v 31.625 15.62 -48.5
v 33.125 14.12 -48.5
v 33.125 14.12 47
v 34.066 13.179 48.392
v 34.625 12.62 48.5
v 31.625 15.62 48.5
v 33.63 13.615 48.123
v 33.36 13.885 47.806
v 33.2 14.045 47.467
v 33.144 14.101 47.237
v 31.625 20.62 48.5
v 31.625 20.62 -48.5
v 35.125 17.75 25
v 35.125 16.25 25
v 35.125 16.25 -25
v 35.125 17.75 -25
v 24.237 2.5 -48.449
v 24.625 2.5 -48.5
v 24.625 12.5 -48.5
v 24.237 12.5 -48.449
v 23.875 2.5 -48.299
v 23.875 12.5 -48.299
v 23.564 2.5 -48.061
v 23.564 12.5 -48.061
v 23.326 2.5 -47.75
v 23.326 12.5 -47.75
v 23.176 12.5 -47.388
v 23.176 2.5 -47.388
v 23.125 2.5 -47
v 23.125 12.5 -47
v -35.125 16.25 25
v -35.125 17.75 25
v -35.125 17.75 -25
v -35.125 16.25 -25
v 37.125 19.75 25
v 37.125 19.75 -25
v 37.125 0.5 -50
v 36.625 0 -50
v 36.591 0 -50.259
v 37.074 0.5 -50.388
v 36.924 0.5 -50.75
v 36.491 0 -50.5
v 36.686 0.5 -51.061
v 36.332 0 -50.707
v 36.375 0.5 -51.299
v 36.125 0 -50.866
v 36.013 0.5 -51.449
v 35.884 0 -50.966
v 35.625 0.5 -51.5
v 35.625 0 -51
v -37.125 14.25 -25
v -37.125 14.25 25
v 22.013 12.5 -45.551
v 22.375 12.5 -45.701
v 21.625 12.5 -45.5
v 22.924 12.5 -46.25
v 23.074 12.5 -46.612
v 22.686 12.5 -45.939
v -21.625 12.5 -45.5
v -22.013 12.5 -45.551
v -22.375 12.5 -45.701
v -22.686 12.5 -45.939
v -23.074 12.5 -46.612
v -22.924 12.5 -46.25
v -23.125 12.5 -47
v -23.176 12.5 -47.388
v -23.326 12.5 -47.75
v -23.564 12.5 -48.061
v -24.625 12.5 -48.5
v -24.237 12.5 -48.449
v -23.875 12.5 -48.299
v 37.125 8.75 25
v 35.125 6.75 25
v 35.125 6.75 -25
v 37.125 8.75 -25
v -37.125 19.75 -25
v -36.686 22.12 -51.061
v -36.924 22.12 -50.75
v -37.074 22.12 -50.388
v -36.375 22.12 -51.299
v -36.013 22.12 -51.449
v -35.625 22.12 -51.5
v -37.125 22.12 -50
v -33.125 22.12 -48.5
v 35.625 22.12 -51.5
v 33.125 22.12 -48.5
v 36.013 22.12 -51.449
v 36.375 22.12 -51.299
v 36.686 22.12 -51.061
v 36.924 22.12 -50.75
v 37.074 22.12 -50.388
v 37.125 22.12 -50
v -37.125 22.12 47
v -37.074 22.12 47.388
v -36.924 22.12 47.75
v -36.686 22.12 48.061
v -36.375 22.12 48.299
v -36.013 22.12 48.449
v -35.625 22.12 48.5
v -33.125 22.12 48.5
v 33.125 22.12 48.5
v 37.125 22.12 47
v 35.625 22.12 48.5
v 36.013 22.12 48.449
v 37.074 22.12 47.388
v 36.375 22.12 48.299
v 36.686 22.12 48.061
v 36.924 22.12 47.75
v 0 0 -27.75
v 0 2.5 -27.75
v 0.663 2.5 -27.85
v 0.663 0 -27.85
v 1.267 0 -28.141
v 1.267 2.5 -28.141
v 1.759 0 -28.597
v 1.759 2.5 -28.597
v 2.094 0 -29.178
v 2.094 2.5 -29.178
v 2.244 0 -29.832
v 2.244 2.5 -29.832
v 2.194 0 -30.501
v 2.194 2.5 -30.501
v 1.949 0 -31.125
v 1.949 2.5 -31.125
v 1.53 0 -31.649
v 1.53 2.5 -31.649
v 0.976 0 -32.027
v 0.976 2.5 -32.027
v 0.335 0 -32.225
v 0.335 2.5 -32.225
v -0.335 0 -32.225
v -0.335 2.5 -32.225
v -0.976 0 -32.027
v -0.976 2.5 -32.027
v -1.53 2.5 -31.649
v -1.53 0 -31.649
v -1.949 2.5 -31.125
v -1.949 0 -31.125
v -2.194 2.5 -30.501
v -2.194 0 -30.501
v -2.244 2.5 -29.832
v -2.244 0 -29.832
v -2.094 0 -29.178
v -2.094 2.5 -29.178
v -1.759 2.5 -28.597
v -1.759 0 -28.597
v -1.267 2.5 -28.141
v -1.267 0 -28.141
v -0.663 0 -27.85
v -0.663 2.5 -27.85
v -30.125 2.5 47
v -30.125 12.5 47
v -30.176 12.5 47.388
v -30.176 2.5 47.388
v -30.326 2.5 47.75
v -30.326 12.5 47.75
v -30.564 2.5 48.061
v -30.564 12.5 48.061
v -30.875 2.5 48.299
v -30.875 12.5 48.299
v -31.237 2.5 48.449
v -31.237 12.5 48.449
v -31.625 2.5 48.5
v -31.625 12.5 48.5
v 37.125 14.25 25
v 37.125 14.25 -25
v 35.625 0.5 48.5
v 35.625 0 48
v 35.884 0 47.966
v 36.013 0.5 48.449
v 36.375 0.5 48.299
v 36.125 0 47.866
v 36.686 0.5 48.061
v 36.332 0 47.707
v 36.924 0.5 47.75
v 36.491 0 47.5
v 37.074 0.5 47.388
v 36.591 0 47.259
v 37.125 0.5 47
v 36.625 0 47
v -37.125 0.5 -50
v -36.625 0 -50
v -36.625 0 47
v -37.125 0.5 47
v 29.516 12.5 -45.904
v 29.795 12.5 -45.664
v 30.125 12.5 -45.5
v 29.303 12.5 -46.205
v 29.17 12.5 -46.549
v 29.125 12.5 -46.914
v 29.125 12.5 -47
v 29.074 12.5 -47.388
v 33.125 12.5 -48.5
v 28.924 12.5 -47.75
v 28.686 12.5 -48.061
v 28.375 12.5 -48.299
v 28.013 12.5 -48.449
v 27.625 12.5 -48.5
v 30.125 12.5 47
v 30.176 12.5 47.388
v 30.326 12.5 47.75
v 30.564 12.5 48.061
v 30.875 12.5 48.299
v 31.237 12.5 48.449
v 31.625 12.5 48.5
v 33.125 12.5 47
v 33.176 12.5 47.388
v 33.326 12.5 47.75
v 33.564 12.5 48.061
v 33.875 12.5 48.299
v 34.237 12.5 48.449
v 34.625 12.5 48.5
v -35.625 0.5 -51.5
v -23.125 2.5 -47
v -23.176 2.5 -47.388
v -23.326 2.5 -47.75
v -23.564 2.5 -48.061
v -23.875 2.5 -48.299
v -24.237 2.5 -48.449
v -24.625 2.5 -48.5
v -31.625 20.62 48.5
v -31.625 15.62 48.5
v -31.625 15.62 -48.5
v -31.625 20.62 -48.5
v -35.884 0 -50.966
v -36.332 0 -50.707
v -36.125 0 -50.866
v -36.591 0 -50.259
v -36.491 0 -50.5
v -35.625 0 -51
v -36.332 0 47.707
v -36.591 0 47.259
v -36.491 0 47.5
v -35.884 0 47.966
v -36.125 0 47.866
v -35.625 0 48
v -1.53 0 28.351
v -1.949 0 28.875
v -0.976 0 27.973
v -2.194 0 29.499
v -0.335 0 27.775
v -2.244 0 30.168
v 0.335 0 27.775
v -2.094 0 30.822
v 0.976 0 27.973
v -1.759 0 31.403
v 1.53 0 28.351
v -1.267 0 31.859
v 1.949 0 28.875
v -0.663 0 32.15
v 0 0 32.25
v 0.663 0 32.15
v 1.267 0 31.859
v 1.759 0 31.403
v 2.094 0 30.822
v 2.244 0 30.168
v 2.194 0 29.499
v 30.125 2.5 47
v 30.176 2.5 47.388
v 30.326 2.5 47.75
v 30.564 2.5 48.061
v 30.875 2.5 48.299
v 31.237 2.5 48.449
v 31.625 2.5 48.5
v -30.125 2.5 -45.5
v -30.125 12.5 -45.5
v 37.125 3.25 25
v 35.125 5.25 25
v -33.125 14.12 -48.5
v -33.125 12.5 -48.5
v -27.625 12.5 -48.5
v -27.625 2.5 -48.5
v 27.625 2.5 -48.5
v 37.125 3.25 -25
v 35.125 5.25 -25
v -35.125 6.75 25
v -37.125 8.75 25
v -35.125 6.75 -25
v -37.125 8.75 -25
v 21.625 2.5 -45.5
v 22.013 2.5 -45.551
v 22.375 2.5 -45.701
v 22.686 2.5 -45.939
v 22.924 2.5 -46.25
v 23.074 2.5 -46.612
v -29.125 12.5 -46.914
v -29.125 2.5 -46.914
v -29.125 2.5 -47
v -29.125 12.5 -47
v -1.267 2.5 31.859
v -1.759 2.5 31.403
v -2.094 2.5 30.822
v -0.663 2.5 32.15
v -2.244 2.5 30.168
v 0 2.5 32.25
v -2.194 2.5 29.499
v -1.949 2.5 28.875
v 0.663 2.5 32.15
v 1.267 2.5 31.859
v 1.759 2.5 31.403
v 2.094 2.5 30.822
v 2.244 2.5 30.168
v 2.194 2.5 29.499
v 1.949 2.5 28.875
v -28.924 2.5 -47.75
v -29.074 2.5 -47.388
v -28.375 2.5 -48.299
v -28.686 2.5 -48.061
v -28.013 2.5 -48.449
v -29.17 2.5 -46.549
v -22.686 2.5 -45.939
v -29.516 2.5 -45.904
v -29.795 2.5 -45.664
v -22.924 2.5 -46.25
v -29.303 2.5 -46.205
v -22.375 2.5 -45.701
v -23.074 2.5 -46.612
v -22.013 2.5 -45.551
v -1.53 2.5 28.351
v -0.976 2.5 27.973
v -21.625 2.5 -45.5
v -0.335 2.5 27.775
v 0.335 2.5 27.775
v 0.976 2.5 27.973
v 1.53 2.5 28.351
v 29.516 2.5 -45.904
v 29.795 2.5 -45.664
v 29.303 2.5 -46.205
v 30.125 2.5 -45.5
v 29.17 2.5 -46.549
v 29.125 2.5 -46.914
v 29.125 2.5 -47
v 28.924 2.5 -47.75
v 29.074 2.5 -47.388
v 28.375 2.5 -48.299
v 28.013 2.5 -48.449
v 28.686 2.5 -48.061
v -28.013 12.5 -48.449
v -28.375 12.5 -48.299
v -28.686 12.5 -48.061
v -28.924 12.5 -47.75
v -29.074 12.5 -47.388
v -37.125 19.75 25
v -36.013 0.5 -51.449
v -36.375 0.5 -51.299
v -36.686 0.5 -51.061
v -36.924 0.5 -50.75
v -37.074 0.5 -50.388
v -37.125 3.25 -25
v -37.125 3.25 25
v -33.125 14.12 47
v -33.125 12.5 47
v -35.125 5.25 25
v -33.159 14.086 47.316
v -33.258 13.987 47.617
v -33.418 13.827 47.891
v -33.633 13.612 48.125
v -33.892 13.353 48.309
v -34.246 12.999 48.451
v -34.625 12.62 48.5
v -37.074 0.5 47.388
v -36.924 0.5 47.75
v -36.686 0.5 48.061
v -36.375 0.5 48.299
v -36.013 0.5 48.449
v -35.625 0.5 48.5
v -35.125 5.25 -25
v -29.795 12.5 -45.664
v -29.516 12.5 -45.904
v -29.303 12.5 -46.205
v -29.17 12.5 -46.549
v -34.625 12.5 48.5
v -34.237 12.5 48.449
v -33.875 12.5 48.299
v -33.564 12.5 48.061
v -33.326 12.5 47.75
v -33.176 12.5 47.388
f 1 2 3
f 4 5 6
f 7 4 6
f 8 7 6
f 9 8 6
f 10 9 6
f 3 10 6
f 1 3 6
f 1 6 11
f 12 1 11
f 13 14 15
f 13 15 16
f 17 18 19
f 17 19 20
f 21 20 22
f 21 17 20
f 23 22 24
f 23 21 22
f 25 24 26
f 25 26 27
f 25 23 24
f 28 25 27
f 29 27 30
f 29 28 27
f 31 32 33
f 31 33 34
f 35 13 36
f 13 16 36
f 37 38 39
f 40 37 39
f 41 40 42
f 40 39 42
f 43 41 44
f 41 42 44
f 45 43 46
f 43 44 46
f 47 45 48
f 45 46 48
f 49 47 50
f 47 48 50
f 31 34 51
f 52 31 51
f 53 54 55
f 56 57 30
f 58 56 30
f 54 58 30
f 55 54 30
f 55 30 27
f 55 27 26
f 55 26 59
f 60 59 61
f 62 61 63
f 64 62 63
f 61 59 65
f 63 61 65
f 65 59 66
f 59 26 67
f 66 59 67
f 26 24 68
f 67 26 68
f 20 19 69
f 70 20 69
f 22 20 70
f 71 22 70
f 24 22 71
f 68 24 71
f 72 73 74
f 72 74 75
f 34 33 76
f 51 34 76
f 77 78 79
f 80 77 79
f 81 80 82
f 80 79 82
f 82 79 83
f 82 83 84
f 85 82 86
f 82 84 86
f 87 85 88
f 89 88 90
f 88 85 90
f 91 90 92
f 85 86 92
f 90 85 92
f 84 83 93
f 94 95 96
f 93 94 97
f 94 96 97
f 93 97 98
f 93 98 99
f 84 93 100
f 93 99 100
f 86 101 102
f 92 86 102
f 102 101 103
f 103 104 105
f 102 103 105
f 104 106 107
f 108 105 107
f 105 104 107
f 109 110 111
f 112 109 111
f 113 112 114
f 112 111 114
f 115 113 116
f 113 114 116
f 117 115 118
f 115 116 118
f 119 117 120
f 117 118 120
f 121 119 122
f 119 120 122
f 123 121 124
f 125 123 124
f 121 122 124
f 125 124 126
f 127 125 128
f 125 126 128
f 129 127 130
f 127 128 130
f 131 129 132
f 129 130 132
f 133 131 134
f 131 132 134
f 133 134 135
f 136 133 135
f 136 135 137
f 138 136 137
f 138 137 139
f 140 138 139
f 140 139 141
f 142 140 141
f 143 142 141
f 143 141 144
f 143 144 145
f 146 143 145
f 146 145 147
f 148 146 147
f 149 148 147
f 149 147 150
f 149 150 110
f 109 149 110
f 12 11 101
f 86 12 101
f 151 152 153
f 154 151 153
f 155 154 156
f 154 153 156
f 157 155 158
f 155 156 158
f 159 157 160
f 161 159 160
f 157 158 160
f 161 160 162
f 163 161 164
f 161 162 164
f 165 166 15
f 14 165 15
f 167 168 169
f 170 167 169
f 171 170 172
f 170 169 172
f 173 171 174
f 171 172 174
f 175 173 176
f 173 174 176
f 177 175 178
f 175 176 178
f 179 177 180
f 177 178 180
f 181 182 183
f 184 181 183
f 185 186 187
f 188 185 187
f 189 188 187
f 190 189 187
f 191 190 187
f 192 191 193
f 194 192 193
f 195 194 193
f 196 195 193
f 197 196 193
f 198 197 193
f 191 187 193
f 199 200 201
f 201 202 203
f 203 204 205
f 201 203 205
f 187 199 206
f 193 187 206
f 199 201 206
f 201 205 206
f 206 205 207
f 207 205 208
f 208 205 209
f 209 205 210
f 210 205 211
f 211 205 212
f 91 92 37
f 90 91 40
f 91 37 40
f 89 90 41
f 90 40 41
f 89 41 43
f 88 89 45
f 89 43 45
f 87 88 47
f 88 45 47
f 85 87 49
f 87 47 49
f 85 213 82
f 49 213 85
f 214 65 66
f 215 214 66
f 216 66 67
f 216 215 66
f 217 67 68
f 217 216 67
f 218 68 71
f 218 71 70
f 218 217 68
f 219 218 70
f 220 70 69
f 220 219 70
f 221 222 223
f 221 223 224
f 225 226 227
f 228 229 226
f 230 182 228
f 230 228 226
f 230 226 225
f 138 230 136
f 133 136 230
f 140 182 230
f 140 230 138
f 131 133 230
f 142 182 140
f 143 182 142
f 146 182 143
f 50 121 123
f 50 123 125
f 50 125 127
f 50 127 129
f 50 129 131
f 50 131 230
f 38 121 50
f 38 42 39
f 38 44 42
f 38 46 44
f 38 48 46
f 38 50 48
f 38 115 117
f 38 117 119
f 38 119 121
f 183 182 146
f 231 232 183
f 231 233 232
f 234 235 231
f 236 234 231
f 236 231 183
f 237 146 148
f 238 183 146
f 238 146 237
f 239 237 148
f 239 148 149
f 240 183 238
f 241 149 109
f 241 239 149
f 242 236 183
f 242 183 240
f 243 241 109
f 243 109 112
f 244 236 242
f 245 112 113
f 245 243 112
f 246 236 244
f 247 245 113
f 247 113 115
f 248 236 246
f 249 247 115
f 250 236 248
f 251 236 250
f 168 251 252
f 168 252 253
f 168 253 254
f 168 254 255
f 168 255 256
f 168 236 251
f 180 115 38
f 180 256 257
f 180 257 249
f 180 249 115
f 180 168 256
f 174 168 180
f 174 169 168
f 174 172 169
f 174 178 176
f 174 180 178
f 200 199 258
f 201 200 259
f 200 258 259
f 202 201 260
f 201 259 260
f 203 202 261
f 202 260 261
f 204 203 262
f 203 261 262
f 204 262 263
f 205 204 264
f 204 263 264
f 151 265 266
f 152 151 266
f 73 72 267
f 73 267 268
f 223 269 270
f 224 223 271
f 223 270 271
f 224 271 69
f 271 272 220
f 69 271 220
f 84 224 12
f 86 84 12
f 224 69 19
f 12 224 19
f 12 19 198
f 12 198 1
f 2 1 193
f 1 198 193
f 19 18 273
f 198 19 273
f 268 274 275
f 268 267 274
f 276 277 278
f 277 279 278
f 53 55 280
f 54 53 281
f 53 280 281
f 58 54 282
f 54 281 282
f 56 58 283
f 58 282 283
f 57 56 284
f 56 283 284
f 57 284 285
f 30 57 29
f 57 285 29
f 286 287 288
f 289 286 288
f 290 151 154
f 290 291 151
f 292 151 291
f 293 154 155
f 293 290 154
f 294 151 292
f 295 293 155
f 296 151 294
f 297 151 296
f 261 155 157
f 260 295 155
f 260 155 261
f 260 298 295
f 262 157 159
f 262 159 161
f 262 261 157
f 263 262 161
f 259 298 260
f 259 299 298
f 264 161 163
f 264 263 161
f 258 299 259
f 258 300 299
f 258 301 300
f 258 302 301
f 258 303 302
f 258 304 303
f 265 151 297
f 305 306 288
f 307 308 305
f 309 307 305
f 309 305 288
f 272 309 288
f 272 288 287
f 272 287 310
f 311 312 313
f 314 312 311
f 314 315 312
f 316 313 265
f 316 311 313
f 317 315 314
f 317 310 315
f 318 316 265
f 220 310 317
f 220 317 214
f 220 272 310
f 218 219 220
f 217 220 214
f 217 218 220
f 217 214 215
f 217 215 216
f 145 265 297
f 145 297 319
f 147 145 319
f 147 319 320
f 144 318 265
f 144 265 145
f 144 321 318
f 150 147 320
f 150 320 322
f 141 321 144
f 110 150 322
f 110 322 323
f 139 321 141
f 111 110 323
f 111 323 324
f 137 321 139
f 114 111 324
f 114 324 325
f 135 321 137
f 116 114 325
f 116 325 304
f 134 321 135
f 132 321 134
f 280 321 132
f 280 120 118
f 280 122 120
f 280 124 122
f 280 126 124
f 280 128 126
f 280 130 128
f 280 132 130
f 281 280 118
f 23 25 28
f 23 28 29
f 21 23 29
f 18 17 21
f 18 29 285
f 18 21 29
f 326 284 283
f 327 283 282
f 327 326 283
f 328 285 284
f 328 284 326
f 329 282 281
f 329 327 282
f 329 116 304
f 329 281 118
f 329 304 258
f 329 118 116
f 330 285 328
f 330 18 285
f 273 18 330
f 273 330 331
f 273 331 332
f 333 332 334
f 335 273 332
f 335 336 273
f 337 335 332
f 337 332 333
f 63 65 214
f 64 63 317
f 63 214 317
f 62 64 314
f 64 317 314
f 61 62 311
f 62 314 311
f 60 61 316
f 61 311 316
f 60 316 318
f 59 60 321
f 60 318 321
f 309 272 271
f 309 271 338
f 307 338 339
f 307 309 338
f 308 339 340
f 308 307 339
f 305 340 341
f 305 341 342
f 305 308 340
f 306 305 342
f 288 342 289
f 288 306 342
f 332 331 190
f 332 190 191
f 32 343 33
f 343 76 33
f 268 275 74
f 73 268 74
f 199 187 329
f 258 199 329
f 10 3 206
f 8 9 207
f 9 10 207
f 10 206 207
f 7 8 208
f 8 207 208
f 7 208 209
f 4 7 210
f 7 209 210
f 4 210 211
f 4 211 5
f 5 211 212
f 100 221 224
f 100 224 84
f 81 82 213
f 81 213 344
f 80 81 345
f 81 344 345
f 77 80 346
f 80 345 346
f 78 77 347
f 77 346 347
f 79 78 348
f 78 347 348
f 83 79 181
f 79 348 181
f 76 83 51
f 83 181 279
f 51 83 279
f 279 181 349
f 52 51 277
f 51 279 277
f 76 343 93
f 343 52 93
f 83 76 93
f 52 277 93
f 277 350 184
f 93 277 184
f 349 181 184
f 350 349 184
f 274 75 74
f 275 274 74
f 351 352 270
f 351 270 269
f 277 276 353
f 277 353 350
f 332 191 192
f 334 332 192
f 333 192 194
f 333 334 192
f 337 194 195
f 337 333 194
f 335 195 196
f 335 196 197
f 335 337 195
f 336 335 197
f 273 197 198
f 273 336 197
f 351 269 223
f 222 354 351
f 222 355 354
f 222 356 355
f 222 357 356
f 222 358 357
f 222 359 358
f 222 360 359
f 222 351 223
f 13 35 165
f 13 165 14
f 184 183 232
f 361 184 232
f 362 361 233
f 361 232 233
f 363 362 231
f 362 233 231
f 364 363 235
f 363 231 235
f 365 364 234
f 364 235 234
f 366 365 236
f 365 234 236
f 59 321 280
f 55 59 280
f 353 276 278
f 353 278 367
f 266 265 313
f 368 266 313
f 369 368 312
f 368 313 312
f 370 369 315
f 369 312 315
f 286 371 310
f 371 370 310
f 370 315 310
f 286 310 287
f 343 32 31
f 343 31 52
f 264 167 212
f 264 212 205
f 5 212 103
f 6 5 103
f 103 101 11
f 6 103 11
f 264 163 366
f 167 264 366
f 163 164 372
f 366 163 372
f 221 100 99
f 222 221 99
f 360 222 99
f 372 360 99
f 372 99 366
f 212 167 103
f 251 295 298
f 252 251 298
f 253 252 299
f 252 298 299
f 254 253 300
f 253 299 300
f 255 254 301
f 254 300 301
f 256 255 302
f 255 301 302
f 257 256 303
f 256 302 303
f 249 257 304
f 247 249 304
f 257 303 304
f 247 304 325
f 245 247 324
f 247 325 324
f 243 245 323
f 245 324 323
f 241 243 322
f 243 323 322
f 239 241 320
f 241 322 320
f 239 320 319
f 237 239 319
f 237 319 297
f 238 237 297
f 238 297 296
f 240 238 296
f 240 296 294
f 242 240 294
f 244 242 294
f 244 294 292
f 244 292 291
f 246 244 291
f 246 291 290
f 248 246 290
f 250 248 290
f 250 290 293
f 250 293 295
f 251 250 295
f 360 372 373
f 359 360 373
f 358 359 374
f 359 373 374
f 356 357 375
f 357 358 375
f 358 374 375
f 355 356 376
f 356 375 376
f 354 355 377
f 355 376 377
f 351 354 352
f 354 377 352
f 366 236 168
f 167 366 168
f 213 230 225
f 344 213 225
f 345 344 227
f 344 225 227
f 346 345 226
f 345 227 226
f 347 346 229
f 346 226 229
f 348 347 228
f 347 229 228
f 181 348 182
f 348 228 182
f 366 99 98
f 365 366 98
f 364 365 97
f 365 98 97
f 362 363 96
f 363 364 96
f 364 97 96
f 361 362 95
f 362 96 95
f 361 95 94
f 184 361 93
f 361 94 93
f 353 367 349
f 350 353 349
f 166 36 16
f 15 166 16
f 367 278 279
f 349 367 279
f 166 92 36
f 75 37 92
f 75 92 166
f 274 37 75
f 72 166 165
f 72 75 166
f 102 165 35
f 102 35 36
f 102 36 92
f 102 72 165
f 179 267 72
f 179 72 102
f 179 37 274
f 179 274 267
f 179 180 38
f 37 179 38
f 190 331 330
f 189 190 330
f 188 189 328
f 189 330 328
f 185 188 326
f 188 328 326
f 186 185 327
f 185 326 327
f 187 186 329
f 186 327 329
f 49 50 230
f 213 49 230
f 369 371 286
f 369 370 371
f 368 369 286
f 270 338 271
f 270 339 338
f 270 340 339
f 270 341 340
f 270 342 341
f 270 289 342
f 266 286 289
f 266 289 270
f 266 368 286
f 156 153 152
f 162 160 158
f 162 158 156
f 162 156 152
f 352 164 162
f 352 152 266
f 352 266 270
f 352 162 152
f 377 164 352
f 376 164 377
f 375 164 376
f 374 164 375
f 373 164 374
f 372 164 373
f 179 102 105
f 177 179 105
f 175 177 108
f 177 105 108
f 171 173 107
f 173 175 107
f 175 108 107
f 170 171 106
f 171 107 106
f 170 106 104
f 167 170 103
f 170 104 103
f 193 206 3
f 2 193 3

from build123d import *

# Parameters (mm, degrees)
SKETCH1_W           = 66.25
SKETCH1_H           = 97
BOSS_EXTRUDE1_DEPTH = 2.5
BOSS_EXTRUDE2_DEPTH = 97
SKETCH3_W           = 1
SKETCH3_H           = 3
BOSS_EXTRUDE3_DEPTH = 10
SKETCH4_W           = 74.25
SKETCH4_H           = 3
BOSS_EXTRUDE4_DEPTH = 22.12
SKETCH6_R           = 2.25
CUT_EXTRUDE1_DEPTH  = 67.448927945
FILLET1_R           = 1.5
CUT_EXTRUDE2_DEPTH  = 25
CHAMFER1_SIZE       = 0.5


with BuildPart() as part:
    # Sketch1 → Boss-Extrude1 (new body)
    with BuildSketch(Plane(origin=(0, 0, 0), x_dir=(1, 0, 0), z_dir=(0, 1, 0))):
        Rectangle(SKETCH1_W, SKETCH1_H)
    extrude(amount=BOSS_EXTRUDE1_DEPTH)

    # Sketch2 → Boss-Extrude2 (add)
    with BuildSketch(Plane.XY.offset(48.5)):
        Polygon((30.125, 2.5), (30.125, 12.5), (33.125, 12.5), (33.125, 14.12), (31.625, 15.62), (31.625, 20.62), (33.125, 22.12), (37.125, 22.12), (37.125, 0), (30.125, 0), align=None)
        Polygon((-31.625, 20.62), (-33.125, 22.12), (-37.125, 22.12), (-37.125, 0), (-30.125, 0), (-30.125, 2.5), (-30.125, 12.5), (-33.125, 12.5), (-33.125, 14.12), (-31.625, 15.62), align=None)
    extrude(amount=-BOSS_EXTRUDE2_DEPTH)

    # Sketch3 → Boss-Extrude3 (add)
    with BuildSketch(Plane(origin=(0, 2.5, 0), x_dir=(1, 0, 0), z_dir=(0, 1, 0))):
        Polygon((-23.125, 48.5), (-23.125, 45.5), (23.125, 45.5), (23.125, 48.5), (0, 48.5), align=None)
        with Locations((29.625, 47)):
            Rectangle(SKETCH3_W, SKETCH3_H)
        with Locations((-29.625, 47)):
            Rectangle(SKETCH3_W, SKETCH3_H)
    extrude(amount=BOSS_EXTRUDE3_DEPTH)

    # Sketch4 → Boss-Extrude4 (add)
    with BuildSketch(Plane.XZ):
        with Locations((0, -50)):
            Rectangle(SKETCH4_W, SKETCH4_H)
    extrude(amount=-BOSS_EXTRUDE4_DEPTH)

    # Sketch6 → Cut-Extrude1 (cut, through all)
    with BuildSketch(Plane(origin=(0, 2.5, 0), x_dir=(1, 0, 0), z_dir=(0, 1, 0))):
        with Locations(Location((0, 30, 0), (0, 0, 270))):
            Circle(SKETCH6_R)
        with Locations(Location((0, -30, 0), (0, 0, 270))):
            Circle(SKETCH6_R)
    extrude(amount=-CUT_EXTRUDE1_DEPTH, mode=Mode.SUBTRACT)

    # Fillet1
    # the kernel refuses this fillet: 1.5 mm, written as the material it adds along each edge
    with BuildSketch(Plane(origin=(29.125, 2.5, -48.5), x_dir=(-1, 0, 0), z_dir=(0, 1, 0)), Plane(origin=(-23.125, 2.5, -48.5), x_dir=(-1, 0, 0), z_dir=(0, 1, 0))) as fillet1_piece_1:
        with BuildLine():
            CenterArc((FILLET1_R, FILLET1_R), FILLET1_R, 180, 90)
            Line((0, FILLET1_R), (0, 0))
            Line((0, 0), (FILLET1_R, 0))
        make_face()
    extrude(amount=10)
    with BuildSketch(Plane(origin=(23.125, 2.5, -48.5), x_dir=(1, 0, 0), z_dir=(0, 1, 0)), Plane(origin=(-29.125, 2.5, -48.5), x_dir=(1, 0, 0), z_dir=(0, 1, 0))) as fillet1_piece_2:
        with BuildLine():
            CenterArc((FILLET1_R, -FILLET1_R), FILLET1_R, 90, 90)
            Line((0, -FILLET1_R), (0, 0))
            Line((0, 0), (FILLET1_R, 0))
        make_face()
    extrude(amount=10)
    # the kernel refuses this fillet: 1.5 mm, written as the material it takes off along each edge
    with BuildSketch(Plane(origin=(-33.125, 12.5, 48.5), x_dir=(-1, 0, 0), z_dir=(0, 1, 0))) as fillet1_2_piece_1_section:
        with BuildLine():
            CenterArc((FILLET1_R, -FILLET1_R), FILLET1_R, 90, 90)
            Line((0, -FILLET1_R), (0, 0))
            Line((0, 0), (FILLET1_R, 0))
        make_face()
    fillet1_2_piece_1 = extrude(amount=5.37, mode=Mode.PRIVATE)
    fillet1_2_piece_1 = split(fillet1_2_piece_1, bisect_by=Plane(origin=(-33.935, 13.31, 48.5), z_dir=(0.7071067811865467, -0.7071067811865483, 0)), keep=Keep.TOP, mode=Mode.PRIVATE)
    add(fillet1_2_piece_1, mode=Mode.SUBTRACT)
    with BuildSketch(Plane(origin=(33.125, 12.5, 48.5), x_dir=(1, 0, 0), z_dir=(0, 1, 0))) as fillet1_2_piece_2_section:
        with BuildLine():
            CenterArc((FILLET1_R, FILLET1_R), FILLET1_R, 180, 90)
            Line((0, FILLET1_R), (0, 0))
            Line((0, 0), (FILLET1_R, 0))
        make_face()
    fillet1_2_piece_2 = extrude(amount=5.37, mode=Mode.PRIVATE)
    fillet1_2_piece_2 = split(fillet1_2_piece_2, bisect_by=Plane(origin=(33.935, 13.31, 48.5), z_dir=(-0.7071067811865438, -0.7071067811865512, 0)), keep=Keep.TOP, mode=Mode.PRIVATE)
    add(fillet1_2_piece_2, mode=Mode.SUBTRACT)
    with BuildSketch(Plane(origin=(-30.125, 16.25, 48.5), x_dir=(-1, 0, 0), z_dir=(0, -1, 0)), Plane(origin=(30.125, 2.5, 48.5), x_dir=(1, 0, 0), z_dir=(0, 1, 0)), Plane(origin=(-23.125, 2.5, -45.5), x_dir=(1, 0, 0), z_dir=(0, 1, 0)), Plane(origin=(23.125, 2.5, -45.5), x_dir=(0, 0, -1), z_dir=(0, 1, 0))) as fillet1_2_piece_3:
        with BuildLine():
            CenterArc((FILLET1_R, FILLET1_R), FILLET1_R, 180, 90)
            Line((0, FILLET1_R), (0, 0))
            Line((0, 0), (FILLET1_R, 0))
        make_face()
    extrude(amount=13.75, mode=Mode.SUBTRACT)
    with BuildSketch(Plane(origin=(29.125, 2.5, -45.5), x_dir=(0, 0, -1), z_dir=(0, 1, 0))) as fillet1_2_piece_4:
        with BuildLine():
            CenterArc((1.414213562, -1.5), FILLET1_R, 90, 70.528779366)
            Line((0, -1), (0, 0))
            Line((0, 0), (1.414213562, 0))
        make_face()
    extrude(amount=13.535533906, mode=Mode.SUBTRACT)
    with BuildSketch(Plane(origin=(-29.125, 2.5, -45.5), x_dir=(0, 0, -1), z_dir=(0, 1, 0))) as fillet1_2_piece_5:
        with BuildLine():
            CenterArc((1.414213562, 1.5), FILLET1_R, 199.471220634, 70.528779366)
            Line((0, 1), (0, 0))
            Line((0, 0), (1.414213562, 0))
        make_face()
    extrude(amount=13.535533906, mode=Mode.SUBTRACT)
    with BuildSketch(Plane(origin=(37.125, 25.87, 48.5), x_dir=(-1, 0, 0), z_dir=(0, -1, 0)), Plane(origin=(-37.125, 25.87, 48.5), x_dir=(0, 0, -1), z_dir=(0, -1, 0)), Plane(origin=(-37.125, -3.75, -51.5), x_dir=(0, 0, 1), z_dir=(0, 1, 0))) as fillet1_2_piece_6:
        with BuildLine():
            CenterArc((FILLET1_R, FILLET1_R), FILLET1_R, 180, 90)
            Line((0, FILLET1_R), (0, 0))
            Line((0, 0), (FILLET1_R, 0))
        make_face()
    extrude(amount=29.62, mode=Mode.SUBTRACT)
    with BuildSketch(Plane(origin=(37.125, -3.75, -51.5), x_dir=(0, 0, 1), z_dir=(0, 1, 0))) as fillet1_2_piece_7:
        with BuildLine():
            CenterArc((FILLET1_R, -FILLET1_R), FILLET1_R, 90, 90)
            Line((0, -FILLET1_R), (0, 0))
            Line((0, 0), (FILLET1_R, 0))
        make_face()
    extrude(amount=29.62, mode=Mode.SUBTRACT)

    # Sketch7 → Cut-Extrude2 (cut, symmetric)
    with BuildSketch(Plane.XY):
        Polygon((-37.125, 8.75), (-35.125, 6.75), (-35.125, 5.25), (-37.125, 3.25), align=None)
        Polygon((-37.125, 19.75), (-35.125, 17.75), (-35.125, 16.25), (-37.125, 14.25), align=None)
        Polygon((37.125, 19.75), (37.125, 14.25), (35.125, 16.25), (35.125, 17.75), align=None)
        Polygon((37.125, 8.75), (37.125, 3.25), (35.125, 5.25), (35.125, 6.75), align=None)
    extrude(amount=CUT_EXTRUDE2_DEPTH, both=True, mode=Mode.SUBTRACT)

    # Chamfer1
    chamfer1_edges = [part.edges().sort_by_distance(p)[0] for p in [
        (0, 0, 48.5),
        (37.125, 0, -1.5),
        (-37.125, 0, -1.5),
        (0, 0, -51.5),
        (36.685660172, 0, -51.060660172),
        (-36.685660172, 0, -51.060660172),
        (-36.685660172, 0, 48.060660172),
        (36.685660172, 0, 48.060660172),
    ]]
    chamfer(chamfer1_edges, length=CHAMFER1_SIZE)


solid = part.part
